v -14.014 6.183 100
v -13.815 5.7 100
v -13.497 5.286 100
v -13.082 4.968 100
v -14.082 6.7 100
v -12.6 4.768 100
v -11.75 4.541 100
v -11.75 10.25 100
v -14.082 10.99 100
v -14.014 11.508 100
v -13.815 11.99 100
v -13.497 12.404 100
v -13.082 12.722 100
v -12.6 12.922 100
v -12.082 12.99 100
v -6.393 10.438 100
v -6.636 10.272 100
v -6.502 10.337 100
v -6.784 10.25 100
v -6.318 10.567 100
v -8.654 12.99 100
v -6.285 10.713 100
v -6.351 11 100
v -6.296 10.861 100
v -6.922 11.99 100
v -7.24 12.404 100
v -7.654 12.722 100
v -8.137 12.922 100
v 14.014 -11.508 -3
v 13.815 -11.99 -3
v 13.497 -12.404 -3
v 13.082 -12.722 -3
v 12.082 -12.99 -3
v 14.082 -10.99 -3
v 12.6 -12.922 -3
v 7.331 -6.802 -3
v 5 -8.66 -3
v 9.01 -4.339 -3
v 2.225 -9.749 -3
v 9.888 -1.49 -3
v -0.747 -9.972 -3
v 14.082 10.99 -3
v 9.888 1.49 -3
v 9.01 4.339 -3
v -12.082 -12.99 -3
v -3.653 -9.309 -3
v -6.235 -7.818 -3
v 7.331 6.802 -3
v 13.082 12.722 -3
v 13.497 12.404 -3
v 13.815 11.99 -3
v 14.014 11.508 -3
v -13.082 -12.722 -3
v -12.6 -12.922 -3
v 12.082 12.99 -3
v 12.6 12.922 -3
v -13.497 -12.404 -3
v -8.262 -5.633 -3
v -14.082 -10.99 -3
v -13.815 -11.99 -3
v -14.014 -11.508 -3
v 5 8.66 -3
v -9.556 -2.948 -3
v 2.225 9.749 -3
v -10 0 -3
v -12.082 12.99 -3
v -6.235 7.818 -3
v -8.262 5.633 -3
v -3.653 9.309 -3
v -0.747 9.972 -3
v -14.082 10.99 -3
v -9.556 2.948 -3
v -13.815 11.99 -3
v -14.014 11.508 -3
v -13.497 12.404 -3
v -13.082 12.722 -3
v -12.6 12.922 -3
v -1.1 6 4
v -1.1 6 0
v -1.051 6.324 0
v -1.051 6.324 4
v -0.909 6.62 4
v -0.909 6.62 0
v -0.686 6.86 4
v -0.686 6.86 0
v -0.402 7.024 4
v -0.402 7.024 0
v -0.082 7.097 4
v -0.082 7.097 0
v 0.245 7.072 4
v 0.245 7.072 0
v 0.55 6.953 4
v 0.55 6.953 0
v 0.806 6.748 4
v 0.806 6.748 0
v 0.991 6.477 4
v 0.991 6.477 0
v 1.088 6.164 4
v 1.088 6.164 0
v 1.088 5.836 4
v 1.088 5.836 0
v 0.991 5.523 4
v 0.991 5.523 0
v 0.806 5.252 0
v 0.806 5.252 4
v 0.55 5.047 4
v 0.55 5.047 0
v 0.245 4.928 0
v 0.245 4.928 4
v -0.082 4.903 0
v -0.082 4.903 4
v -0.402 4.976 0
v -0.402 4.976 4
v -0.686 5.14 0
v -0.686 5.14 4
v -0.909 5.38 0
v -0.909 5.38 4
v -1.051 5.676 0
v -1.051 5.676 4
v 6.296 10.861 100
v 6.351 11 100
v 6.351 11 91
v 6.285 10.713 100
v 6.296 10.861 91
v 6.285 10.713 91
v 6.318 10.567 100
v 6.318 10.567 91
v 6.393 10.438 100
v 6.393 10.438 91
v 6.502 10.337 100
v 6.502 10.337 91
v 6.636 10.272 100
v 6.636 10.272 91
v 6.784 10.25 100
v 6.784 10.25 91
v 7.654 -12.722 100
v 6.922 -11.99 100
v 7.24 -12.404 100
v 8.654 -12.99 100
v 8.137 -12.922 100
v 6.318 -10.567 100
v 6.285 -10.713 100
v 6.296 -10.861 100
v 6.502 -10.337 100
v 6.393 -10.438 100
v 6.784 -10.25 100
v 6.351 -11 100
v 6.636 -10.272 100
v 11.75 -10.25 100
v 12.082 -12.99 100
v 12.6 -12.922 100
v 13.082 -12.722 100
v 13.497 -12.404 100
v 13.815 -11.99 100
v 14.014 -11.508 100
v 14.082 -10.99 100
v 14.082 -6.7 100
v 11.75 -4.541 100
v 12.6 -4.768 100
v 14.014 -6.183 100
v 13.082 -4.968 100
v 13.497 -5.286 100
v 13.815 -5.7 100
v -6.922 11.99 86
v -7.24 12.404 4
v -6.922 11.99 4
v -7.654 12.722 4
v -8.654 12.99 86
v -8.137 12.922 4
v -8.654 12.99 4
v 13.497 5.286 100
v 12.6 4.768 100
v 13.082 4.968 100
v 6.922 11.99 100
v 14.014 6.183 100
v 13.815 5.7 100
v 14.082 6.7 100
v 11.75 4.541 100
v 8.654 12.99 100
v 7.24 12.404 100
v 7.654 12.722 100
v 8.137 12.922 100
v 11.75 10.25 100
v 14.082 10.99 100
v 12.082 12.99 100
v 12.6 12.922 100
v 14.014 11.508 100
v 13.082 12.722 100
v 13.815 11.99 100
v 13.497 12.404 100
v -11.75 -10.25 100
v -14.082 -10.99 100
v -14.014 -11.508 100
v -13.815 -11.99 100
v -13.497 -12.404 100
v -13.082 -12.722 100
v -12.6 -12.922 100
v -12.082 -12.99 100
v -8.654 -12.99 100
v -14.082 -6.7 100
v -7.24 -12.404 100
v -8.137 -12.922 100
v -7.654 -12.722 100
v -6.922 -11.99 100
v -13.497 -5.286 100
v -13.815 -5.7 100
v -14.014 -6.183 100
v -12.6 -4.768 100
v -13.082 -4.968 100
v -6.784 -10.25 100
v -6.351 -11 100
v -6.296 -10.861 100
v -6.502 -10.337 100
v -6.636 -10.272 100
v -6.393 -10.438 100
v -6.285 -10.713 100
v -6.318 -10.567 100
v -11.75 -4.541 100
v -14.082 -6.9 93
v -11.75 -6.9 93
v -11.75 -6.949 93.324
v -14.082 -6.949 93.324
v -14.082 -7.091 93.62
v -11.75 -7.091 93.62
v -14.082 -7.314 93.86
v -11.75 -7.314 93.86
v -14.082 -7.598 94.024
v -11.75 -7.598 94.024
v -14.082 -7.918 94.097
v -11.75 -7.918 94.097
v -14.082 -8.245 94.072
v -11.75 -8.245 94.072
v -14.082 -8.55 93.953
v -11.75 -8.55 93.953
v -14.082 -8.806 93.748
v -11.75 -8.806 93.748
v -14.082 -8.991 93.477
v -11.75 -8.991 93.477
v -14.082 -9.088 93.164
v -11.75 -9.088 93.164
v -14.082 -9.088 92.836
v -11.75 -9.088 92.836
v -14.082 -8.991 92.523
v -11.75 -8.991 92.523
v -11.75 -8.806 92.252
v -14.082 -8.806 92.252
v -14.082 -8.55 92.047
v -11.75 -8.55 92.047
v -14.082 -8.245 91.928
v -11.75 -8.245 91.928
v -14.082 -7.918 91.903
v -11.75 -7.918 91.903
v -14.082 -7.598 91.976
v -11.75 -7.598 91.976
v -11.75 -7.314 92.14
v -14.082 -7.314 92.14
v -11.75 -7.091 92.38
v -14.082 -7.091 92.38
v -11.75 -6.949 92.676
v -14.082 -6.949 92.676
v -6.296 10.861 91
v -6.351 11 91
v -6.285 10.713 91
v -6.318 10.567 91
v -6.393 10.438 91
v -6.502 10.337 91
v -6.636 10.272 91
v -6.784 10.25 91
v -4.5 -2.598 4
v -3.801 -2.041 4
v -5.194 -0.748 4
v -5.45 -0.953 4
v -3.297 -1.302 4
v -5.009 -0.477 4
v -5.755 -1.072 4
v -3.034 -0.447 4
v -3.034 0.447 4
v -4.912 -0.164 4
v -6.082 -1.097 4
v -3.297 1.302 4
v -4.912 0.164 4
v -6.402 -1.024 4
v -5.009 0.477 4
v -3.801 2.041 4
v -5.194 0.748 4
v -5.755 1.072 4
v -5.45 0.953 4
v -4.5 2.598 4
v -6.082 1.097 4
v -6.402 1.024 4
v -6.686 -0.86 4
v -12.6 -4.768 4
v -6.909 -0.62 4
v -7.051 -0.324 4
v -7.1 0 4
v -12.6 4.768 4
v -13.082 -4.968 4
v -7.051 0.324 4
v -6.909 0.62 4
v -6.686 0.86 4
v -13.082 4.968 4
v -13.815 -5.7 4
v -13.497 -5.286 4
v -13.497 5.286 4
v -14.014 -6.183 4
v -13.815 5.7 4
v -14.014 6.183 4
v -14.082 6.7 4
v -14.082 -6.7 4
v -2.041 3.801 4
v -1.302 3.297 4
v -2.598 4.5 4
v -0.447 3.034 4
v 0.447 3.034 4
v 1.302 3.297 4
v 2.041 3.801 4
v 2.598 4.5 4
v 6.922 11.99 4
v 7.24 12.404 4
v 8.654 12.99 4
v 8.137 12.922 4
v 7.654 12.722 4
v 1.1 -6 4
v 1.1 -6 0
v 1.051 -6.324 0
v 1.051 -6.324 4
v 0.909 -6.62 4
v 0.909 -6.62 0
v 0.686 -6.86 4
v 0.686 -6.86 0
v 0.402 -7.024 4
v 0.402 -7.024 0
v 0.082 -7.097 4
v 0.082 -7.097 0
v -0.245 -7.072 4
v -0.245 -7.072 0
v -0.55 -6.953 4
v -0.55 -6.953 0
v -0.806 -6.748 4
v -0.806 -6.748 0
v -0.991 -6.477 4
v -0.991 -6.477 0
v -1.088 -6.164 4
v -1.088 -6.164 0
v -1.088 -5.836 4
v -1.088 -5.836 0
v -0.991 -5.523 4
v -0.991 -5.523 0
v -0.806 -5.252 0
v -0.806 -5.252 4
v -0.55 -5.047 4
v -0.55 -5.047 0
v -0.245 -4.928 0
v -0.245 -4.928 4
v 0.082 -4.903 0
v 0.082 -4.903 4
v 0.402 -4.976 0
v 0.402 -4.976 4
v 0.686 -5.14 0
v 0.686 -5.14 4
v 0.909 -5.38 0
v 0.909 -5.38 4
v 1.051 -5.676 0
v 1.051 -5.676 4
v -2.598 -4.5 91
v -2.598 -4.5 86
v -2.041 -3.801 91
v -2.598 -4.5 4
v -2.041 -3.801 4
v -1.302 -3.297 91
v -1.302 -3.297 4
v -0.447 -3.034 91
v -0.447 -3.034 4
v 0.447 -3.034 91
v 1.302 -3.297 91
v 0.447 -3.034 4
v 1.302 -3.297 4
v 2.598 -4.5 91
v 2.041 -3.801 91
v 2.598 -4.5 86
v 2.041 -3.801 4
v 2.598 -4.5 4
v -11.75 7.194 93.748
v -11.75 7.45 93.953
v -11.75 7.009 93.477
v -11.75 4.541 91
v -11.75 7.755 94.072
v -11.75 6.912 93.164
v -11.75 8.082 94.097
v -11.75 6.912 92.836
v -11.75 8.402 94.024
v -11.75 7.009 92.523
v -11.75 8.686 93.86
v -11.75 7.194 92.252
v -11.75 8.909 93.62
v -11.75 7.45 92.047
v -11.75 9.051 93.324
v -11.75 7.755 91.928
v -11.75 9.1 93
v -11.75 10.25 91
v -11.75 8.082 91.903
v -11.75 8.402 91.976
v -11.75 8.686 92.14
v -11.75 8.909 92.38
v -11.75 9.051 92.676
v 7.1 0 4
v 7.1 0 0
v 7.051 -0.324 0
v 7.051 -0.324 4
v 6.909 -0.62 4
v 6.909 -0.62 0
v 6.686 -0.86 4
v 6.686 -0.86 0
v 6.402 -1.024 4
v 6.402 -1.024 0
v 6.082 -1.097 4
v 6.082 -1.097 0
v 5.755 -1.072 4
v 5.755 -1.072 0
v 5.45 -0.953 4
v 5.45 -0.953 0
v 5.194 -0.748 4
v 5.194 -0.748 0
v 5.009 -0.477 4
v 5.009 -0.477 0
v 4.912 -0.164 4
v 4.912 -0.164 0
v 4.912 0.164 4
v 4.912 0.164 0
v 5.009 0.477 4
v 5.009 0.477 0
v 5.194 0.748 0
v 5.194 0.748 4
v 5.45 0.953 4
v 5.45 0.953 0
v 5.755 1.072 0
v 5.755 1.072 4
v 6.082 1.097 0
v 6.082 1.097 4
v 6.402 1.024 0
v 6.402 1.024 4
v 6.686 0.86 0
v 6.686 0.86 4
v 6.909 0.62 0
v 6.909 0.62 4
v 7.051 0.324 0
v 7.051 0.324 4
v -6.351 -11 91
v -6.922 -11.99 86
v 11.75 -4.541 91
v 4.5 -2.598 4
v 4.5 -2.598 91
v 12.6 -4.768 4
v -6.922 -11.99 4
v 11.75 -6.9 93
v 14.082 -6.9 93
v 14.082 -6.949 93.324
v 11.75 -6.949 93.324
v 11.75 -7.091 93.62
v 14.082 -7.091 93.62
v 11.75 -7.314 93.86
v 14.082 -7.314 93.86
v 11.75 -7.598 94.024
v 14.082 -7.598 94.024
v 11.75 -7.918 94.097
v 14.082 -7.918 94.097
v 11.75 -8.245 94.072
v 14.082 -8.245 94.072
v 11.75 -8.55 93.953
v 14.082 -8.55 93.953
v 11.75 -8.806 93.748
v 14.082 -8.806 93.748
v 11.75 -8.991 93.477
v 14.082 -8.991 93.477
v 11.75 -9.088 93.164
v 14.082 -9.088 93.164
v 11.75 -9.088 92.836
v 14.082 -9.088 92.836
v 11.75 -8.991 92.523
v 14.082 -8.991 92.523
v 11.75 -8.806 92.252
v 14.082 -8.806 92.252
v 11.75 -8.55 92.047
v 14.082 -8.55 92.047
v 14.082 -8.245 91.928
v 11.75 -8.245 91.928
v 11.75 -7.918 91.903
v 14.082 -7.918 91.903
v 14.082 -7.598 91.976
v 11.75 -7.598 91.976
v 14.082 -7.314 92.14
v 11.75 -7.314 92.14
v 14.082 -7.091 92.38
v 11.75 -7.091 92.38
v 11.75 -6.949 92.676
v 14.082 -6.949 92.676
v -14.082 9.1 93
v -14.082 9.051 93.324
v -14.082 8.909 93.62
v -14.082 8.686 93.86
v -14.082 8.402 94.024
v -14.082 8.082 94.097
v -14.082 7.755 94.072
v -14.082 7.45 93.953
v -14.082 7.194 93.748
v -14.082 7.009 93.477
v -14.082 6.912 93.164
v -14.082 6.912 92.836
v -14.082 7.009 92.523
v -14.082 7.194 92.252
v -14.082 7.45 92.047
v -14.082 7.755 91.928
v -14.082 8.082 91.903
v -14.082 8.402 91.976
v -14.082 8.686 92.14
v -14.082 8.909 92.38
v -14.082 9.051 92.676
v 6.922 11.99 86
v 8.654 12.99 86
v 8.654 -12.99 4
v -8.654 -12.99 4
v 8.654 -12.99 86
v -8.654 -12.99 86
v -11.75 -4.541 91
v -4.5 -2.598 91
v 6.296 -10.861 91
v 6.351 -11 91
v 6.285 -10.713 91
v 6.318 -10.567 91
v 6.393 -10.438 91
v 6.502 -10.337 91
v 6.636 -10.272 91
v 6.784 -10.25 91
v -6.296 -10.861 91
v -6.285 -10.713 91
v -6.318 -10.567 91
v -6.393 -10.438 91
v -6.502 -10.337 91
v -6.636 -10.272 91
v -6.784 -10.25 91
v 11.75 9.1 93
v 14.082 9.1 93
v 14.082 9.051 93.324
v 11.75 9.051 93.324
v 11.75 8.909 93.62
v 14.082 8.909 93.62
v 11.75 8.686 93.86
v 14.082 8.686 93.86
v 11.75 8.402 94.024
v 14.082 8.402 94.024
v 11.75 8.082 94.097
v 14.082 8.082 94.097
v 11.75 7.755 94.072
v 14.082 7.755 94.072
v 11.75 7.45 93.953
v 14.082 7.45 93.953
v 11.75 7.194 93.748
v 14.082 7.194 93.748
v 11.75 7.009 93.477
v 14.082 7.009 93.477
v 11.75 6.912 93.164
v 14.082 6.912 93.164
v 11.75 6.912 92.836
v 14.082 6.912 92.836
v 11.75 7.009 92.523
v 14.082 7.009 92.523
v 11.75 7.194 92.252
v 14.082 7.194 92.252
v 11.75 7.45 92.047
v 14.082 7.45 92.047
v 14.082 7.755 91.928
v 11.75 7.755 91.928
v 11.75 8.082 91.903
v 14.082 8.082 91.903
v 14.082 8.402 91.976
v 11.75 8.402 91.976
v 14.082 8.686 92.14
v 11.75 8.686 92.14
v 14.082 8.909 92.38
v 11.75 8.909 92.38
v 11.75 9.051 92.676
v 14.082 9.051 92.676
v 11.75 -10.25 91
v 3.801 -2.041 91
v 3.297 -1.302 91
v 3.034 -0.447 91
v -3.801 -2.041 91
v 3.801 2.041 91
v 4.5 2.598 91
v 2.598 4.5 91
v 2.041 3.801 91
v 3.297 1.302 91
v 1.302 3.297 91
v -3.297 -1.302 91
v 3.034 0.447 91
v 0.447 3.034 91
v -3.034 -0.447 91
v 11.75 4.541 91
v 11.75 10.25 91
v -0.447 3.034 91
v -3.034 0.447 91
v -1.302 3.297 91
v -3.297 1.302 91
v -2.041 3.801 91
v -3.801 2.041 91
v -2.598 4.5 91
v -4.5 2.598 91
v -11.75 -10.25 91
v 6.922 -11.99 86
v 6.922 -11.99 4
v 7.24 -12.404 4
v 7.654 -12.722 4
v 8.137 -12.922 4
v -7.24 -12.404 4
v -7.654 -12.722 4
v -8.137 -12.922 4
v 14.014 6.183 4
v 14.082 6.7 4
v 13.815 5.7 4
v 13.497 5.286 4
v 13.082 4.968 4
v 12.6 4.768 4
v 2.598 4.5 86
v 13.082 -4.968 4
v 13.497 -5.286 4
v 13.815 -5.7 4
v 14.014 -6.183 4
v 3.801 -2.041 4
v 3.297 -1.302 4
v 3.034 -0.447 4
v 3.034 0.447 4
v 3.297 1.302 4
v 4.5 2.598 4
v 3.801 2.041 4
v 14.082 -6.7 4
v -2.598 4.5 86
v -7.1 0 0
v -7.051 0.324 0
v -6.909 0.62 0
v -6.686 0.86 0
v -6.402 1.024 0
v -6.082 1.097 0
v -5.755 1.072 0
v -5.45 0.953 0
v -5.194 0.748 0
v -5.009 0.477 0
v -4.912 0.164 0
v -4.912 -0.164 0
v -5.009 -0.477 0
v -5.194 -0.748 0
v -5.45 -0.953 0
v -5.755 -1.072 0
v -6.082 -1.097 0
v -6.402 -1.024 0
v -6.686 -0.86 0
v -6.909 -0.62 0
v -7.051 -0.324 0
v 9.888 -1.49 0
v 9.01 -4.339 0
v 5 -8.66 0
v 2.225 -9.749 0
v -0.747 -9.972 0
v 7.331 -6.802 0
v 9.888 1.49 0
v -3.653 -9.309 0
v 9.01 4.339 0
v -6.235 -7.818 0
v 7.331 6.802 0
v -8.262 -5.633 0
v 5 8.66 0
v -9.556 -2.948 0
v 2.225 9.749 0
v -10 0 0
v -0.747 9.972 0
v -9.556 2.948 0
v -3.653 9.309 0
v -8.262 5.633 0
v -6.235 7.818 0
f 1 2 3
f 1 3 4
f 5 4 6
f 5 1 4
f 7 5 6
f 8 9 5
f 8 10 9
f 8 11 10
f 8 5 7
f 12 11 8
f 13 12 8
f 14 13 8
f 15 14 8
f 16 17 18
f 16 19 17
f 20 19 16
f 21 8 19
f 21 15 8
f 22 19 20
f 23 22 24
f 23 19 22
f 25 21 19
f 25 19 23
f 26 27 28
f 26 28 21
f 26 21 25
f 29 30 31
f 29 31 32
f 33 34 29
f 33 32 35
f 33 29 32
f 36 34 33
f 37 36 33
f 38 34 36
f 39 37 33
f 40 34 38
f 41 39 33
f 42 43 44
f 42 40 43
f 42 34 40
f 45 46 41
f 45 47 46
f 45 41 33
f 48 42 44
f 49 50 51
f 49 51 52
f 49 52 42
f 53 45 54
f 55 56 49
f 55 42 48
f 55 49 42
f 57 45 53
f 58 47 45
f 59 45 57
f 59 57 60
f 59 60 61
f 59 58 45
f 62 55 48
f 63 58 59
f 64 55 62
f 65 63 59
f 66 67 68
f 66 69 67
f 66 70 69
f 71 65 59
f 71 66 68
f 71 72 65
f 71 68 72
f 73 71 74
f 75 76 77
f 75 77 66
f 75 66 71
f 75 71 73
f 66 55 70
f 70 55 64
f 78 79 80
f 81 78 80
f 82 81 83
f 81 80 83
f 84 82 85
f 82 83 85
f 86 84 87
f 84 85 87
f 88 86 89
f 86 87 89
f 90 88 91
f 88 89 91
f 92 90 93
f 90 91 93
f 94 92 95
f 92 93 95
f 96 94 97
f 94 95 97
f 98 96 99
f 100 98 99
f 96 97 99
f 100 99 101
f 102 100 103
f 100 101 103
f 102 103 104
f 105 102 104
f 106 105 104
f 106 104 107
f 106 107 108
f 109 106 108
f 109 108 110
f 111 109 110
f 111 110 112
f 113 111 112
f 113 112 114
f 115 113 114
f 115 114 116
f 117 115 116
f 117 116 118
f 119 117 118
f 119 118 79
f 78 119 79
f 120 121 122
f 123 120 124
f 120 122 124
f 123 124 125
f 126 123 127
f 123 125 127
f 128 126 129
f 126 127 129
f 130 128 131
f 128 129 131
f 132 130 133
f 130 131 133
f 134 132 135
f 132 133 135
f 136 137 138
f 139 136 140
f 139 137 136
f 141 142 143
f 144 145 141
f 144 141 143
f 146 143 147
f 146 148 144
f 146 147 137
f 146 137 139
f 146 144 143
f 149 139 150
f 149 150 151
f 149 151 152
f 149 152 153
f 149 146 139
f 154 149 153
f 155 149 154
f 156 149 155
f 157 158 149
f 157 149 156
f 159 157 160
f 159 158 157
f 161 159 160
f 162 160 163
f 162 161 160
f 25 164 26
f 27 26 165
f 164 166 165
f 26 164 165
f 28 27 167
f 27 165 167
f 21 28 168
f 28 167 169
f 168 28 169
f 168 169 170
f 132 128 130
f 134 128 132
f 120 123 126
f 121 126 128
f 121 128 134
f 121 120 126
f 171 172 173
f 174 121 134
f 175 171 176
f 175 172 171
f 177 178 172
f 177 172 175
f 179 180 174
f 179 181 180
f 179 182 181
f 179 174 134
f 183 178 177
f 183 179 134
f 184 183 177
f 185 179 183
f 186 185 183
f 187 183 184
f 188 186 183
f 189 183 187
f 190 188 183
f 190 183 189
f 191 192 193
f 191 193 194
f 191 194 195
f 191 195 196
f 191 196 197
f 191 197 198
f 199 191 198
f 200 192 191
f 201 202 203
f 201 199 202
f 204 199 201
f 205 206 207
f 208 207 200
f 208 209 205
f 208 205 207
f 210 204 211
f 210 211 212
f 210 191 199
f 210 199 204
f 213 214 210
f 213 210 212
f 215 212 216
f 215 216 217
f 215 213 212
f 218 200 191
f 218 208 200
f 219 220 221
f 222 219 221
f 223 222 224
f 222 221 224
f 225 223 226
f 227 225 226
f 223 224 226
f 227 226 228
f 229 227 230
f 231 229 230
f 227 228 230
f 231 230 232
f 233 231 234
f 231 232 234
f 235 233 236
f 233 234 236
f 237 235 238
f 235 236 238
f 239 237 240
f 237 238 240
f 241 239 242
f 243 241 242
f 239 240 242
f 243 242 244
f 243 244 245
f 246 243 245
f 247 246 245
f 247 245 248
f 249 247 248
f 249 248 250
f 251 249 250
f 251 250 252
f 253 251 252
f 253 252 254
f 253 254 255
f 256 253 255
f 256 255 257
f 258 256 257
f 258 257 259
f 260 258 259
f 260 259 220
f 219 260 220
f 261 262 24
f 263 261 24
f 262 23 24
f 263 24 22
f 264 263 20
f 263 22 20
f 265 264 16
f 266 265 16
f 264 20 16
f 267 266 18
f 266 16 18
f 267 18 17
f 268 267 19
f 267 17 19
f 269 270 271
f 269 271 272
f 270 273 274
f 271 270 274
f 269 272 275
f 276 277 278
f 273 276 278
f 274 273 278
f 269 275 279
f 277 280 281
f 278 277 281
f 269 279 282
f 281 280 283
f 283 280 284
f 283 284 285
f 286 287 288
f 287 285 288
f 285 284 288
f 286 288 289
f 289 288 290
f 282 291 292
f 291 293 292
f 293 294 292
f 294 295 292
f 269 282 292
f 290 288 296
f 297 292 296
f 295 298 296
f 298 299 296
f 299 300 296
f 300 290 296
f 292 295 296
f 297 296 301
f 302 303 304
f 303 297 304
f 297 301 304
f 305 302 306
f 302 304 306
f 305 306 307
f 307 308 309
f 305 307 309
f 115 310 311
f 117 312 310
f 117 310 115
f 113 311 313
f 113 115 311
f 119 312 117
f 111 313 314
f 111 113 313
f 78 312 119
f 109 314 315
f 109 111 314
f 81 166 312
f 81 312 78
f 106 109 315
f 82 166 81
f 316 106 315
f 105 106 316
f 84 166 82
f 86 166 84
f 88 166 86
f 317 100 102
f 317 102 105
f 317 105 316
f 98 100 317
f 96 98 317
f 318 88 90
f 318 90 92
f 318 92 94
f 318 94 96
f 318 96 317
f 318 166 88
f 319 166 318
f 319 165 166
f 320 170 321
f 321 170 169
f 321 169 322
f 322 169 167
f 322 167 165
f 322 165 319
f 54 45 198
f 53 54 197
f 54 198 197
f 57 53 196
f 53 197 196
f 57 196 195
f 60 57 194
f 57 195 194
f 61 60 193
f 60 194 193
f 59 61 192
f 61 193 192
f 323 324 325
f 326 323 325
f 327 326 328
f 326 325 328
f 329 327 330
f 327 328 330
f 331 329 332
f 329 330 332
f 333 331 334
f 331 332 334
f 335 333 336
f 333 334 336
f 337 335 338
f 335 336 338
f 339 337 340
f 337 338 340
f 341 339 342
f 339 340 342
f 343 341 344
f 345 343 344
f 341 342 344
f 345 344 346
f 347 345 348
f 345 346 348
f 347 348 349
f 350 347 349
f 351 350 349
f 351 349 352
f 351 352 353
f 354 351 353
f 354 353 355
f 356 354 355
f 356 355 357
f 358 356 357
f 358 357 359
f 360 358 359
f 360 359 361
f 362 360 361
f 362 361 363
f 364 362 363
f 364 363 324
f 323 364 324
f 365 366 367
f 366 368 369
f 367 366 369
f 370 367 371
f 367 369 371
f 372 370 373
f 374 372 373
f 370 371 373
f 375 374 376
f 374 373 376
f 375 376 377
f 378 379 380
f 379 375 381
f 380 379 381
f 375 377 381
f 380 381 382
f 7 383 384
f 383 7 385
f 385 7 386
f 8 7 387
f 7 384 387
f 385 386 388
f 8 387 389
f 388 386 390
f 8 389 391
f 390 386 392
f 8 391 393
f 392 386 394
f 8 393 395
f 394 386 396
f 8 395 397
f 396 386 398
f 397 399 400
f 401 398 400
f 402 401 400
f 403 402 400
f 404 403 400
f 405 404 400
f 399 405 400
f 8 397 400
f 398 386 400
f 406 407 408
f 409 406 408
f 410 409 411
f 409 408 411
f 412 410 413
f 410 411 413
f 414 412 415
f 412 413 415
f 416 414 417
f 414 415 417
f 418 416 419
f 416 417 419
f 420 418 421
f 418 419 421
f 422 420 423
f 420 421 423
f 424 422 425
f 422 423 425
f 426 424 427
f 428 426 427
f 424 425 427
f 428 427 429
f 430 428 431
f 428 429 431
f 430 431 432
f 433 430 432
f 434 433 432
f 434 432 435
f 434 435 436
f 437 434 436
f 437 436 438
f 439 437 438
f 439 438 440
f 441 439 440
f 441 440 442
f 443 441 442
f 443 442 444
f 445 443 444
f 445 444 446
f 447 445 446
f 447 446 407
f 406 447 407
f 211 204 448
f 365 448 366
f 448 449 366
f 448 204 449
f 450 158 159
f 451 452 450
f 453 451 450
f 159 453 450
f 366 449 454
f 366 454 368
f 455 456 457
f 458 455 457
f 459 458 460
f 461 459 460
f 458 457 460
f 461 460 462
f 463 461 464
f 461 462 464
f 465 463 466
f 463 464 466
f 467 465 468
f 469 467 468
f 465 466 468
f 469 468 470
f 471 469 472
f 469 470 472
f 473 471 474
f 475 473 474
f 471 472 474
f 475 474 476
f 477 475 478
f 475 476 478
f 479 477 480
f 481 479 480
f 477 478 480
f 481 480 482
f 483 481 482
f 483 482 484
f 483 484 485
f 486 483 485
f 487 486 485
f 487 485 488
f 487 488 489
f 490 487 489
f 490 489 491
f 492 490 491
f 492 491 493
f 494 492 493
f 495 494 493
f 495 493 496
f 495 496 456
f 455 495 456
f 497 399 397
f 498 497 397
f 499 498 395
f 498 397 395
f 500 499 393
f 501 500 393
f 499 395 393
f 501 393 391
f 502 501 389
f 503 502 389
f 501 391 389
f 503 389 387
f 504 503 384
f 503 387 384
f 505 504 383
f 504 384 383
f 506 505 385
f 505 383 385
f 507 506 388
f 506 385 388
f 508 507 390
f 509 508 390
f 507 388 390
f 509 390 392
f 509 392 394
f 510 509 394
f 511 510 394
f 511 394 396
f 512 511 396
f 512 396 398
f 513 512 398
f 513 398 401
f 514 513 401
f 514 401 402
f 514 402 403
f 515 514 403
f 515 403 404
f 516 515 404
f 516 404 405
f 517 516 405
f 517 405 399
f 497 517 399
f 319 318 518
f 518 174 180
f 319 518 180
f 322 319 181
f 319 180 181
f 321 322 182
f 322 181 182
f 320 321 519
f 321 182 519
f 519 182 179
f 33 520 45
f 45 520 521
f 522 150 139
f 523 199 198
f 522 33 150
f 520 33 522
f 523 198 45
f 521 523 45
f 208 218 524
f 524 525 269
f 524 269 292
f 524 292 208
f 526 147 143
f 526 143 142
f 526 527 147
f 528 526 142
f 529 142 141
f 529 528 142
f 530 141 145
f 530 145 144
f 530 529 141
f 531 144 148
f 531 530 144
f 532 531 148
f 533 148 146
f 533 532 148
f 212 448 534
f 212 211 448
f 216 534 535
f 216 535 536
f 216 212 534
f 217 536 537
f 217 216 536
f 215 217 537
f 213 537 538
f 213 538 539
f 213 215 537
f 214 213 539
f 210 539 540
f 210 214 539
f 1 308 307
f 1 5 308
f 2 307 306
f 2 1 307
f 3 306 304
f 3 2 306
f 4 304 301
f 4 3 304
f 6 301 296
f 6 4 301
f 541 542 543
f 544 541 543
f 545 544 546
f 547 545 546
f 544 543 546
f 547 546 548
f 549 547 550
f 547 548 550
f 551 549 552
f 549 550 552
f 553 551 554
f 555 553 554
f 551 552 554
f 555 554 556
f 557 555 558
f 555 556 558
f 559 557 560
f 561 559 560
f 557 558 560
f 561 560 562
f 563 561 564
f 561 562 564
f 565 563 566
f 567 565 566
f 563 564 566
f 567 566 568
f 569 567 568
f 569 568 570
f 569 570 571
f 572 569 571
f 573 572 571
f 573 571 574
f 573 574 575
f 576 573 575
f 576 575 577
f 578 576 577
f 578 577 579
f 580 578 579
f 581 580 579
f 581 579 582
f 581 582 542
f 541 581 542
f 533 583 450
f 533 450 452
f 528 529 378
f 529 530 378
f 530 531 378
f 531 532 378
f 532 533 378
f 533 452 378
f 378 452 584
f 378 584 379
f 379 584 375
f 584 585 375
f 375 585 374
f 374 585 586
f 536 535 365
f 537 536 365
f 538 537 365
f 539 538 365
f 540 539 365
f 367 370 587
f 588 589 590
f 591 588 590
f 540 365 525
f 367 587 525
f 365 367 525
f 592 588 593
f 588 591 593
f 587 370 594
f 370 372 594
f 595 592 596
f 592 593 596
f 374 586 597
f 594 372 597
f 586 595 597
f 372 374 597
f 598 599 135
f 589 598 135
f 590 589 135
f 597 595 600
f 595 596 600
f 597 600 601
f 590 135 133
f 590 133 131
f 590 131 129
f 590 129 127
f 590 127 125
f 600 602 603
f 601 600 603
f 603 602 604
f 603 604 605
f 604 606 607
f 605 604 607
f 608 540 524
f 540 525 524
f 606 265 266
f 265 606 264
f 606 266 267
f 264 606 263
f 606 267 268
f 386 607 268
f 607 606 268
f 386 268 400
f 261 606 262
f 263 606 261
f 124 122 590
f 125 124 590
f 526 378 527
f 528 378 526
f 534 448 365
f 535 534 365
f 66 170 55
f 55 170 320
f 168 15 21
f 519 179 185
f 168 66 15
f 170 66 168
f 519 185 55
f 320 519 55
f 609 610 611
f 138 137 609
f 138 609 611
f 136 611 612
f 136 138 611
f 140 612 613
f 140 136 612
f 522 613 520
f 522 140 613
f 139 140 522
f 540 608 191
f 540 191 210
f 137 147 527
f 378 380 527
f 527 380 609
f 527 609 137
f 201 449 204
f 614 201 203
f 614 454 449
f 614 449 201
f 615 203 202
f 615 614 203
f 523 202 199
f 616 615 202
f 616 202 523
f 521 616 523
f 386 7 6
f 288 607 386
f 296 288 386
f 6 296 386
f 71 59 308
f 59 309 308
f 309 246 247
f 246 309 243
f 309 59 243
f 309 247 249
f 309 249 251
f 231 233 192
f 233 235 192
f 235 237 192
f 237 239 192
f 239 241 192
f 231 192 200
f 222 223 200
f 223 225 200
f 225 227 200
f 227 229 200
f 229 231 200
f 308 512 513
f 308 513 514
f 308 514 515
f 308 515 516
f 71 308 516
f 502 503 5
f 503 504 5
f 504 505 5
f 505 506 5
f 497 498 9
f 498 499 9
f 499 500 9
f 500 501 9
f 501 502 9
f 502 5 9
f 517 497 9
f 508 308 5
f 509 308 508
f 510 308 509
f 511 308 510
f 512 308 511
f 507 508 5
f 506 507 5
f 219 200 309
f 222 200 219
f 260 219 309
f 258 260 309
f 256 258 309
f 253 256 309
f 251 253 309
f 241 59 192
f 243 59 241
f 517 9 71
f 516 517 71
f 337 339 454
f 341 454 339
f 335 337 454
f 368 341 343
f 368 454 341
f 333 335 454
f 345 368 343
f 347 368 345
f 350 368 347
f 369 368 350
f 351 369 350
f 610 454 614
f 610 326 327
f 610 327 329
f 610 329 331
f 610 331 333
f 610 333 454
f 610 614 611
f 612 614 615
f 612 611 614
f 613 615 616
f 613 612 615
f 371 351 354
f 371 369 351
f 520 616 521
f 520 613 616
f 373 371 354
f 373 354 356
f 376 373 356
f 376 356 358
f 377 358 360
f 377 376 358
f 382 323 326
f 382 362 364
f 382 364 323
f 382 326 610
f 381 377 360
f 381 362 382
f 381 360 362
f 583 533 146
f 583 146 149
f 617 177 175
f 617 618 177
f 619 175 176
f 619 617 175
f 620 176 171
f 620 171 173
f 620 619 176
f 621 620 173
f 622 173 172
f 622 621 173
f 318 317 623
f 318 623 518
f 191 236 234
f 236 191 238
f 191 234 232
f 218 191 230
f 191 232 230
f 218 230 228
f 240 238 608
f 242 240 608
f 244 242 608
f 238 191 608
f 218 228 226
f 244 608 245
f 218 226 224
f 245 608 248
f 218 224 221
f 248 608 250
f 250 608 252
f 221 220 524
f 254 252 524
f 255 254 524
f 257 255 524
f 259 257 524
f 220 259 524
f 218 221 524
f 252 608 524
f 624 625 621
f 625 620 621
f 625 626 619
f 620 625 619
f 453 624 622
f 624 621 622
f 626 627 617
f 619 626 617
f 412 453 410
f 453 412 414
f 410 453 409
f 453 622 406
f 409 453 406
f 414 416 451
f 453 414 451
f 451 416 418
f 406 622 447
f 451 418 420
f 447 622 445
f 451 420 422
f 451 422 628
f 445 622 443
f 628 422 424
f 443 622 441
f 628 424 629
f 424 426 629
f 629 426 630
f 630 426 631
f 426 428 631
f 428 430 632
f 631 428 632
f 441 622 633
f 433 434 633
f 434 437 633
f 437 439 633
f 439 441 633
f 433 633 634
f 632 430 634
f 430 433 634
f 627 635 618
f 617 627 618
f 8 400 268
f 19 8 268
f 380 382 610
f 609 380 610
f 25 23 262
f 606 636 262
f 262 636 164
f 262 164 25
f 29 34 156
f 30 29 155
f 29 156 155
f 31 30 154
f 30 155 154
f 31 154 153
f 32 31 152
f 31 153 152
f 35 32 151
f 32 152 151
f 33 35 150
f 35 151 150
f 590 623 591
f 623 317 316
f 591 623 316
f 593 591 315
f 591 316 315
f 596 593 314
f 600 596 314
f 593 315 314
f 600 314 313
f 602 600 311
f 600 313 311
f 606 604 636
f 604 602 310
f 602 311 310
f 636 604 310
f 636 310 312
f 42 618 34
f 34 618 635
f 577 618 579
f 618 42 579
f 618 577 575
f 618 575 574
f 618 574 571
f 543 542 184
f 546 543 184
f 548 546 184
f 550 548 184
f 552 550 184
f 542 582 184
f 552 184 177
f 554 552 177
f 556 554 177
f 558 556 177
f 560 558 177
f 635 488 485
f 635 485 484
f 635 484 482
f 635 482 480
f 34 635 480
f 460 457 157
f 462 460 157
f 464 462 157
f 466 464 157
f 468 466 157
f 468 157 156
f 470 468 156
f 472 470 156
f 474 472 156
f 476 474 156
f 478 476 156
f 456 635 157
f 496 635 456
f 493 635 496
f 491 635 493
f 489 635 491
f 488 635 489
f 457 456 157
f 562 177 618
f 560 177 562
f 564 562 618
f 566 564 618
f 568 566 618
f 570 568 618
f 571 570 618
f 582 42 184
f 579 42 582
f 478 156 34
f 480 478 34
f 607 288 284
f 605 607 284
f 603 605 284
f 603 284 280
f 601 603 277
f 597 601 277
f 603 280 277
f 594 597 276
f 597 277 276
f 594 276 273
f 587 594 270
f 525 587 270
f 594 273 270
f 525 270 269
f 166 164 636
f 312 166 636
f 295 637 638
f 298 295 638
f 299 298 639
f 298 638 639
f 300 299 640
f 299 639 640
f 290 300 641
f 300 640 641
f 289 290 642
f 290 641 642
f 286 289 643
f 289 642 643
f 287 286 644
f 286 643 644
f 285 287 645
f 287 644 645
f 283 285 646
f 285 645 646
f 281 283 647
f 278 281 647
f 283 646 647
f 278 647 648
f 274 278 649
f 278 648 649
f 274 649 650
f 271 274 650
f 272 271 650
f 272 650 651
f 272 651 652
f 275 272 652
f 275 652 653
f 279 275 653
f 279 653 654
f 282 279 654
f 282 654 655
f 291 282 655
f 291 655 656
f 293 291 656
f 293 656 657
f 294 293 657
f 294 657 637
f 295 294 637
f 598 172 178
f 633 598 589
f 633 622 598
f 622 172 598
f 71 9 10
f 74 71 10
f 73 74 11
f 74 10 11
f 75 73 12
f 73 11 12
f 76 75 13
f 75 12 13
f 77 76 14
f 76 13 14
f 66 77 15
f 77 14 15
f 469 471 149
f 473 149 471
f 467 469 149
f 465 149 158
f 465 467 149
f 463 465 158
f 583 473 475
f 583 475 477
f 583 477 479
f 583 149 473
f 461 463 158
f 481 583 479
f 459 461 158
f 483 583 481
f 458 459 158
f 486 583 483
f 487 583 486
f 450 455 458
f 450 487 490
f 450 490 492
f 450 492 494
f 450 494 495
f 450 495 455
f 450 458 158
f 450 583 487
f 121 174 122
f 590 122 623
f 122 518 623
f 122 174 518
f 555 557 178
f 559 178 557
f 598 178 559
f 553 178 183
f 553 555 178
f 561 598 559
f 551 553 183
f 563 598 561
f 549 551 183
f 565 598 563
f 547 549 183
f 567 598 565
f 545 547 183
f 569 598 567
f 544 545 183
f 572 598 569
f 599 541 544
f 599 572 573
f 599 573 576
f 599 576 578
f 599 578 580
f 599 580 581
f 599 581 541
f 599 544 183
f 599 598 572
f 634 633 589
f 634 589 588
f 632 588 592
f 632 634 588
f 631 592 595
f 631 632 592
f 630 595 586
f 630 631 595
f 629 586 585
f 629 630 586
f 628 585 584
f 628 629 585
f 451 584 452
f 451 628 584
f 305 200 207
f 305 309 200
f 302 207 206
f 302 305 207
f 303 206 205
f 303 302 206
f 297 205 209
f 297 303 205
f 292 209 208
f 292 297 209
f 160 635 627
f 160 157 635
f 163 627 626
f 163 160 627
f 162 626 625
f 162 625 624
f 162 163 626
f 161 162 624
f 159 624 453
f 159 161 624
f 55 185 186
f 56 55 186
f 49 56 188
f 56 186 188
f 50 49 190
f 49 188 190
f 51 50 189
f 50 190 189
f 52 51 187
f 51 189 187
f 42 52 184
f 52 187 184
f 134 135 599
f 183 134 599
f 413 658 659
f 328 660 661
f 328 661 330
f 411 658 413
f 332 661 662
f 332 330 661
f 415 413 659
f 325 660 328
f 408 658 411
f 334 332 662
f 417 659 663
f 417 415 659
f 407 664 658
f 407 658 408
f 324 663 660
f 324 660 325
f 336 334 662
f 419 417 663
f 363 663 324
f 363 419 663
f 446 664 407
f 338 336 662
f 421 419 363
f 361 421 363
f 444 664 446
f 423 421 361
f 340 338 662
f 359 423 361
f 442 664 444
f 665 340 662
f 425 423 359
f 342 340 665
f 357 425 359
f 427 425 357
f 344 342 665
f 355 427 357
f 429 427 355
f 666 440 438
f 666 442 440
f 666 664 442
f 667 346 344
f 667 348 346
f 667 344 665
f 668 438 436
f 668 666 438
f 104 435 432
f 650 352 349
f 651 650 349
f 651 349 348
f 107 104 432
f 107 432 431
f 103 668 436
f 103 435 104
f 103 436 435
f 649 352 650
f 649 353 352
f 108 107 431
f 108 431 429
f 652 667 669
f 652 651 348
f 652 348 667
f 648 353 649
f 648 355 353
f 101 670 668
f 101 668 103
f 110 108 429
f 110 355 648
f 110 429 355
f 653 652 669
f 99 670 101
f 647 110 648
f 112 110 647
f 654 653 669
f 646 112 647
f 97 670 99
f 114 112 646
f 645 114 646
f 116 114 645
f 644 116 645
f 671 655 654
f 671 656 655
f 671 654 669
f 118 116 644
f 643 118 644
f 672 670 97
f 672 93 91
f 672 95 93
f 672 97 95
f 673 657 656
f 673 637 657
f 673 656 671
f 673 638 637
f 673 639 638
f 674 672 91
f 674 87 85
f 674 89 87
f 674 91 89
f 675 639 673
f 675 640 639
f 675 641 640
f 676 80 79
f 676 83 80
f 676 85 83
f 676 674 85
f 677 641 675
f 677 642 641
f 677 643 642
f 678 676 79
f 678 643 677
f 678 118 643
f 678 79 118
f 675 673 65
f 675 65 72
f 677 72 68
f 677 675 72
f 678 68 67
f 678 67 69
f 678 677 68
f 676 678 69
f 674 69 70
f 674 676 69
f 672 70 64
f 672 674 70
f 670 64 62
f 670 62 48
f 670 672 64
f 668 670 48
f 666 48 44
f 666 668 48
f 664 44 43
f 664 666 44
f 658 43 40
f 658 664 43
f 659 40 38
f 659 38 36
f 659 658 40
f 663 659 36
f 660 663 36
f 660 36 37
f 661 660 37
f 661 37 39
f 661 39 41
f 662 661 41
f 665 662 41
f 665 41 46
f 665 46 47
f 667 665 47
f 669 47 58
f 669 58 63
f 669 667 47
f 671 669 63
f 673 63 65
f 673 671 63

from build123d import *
from build123d.topology import SkipClean

# Parameters (mm, degrees)
SKETCH_1_R               = 15
EXTRUDE_1_DEPTH          = 91
SKETCH_2_R               = 1.1
CUT_EXTRUDE_1_DEPTH      = 10
SKETCH_3_W               = 28.98
SKETCH_3_H               = 25.98
SKETCH_3_W_2             = 23.5
SKETCH_3_H_2             = 20.5
EXTRUDE_2_DEPTH          = 9
CUT_EXTRUDE_2_DEPTH      = 87
SKETCH_6_W               = 28.98
SKETCH_6_H               = 25.98
EXTRUDE_6_DEPTH          = 5
SKETCH_7_R               = 1.1
CUT_EXTRUDE_3_DEPTH      = 106.331192436
SKETCH_10_R              = 0.8
CUT_EXTRUDE_4_DEPTH      = 99.315817649
CUT_EXTRUDE_5_DEPTH      = 89.577649551
FILLET_1_R               = 0.5
EXTRUDE_7_DEPTH          = 82
SKETCH_17_W              = 0.407540604
SKETCH_17_H              = 25.98
CUT_EXTRUDE_7_DEPTH      = 89.577649551
FILLET_3_R               = 2
CUT_EXTRUDE_6_DEPTH      = 89.577649551
PATTERN_CIRCULAR_4_COUNT = 4
BOSS_EXTRUDE1_START      = 86
BOSS_EXTRUDE1_DEPTH      = 86
SKETCH3_OUTSIDE_W        = 53.726
SKETCH3_OUTSIDE_H        = 53.726
CUT_EXTRUDE1_DEPTH       = 103.225241501
SKETCH4_R                = 10
SKETCH4_R_2              = 0.8
BOSS_EXTRUDE2_DEPTH      = 3
FILLET1_R                = 2
SKETCH5_R                = 0.8
BOSS_EXTRUDE3_DEPTH      = 7


with BuildPart() as part:
    # 草图1 → 凸台-拉伸1 (new body)
    with BuildSketch(Plane.XY):
        Circle(SKETCH_1_R)
    extrude(amount=EXTRUDE_1_DEPTH)

    # 草图2 → 切除-拉伸1 (cut)
    with BuildSketch(Plane(origin=(0, 0, 0), x_dir=(-1, 0, 0), z_dir=(0, 0, -1))):
        with Locations((0, 6)):
            Circle(SKETCH_2_R)
        with Locations(Location((0, -6, 0), (0, 0, 180))):
            Circle(SKETCH_2_R)
        with Locations((6, 0)):
            Circle(SKETCH_2_R)
        with Locations(Location((-6, 0, 0), (0, 0, 180))):
            Circle(SKETCH_2_R)
    extrude(amount=-CUT_EXTRUDE_1_DEPTH, mode=Mode.SUBTRACT)

    # 草图3 → 凸台-拉伸2 (add)
    with BuildSketch(Plane.XY.offset(91)):
        Rectangle(SKETCH_3_W, SKETCH_3_H)
        Rectangle(SKETCH_3_W_2, SKETCH_3_H_2, mode=Mode.SUBTRACT)
    extrude(amount=EXTRUDE_2_DEPTH)

    # 草图4 → 切除-拉伸2 (cut)
    with BuildSketch(Plane(origin=(0, 0, 4), x_dir=(-1, 0, 0), z_dir=(0, 0, -1))):
        with BuildLine():
            Line((-2.598076211, 4.5), (-7.5, 12.990381057))
            ThreePointArc((-7.5, 12.990381057), (0, 15), (7.5, 12.990381057))
            Line((7.5, 12.990381057), (2.598076211, 4.5))
            ThreePointArc((2.598076211, 4.5), (0, 3), (-2.598076211, 4.5))
        make_face()
        with BuildLine():
            Line((4.5, -2.598076211), (12.990381057, -7.5))
            ThreePointArc((12.990381057, -7.5), (15, 0), (12.990381057, 7.5))
            Line((12.990381057, 7.5), (4.5, 2.598076211))
            ThreePointArc((4.5, 2.598076211), (3, 0), (4.5, -2.598076211))
        make_face()
        with BuildLine():
            Line((-2.598076211, -4.5), (-7.5, -12.990381057))
            ThreePointArc((-7.5, -12.990381057), (0, -15), (7.5, -12.990381057))
            Line((7.5, -12.990381057), (2.598076211, -4.5))
            ThreePointArc((2.598076211, -4.5), (0, -3), (-2.598076211, -4.5))
        make_face()
        with BuildLine():
            Line((-4.5, 2.598076211), (-12.990381057, 7.5))
            ThreePointArc((-12.990381057, 7.5), (-15, 0), (-12.990381057, -7.5))
            Line((-12.990381057, -7.5), (-4.5, -2.598076211))
            ThreePointArc((-4.5, -2.598076211), (-3, 0), (-4.5, 2.598076211))
        make_face()
    extrude(amount=-CUT_EXTRUDE_2_DEPTH, mode=Mode.SUBTRACT)

    # 草图6 → 凸台-拉伸6 (add)
    with BuildSketch(Plane(origin=(0, 0, 91), x_dir=(-1, 0, 0), z_dir=(0, 0, -1))):
        Rectangle(SKETCH_6_W, SKETCH_6_H)
    extrude(amount=EXTRUDE_6_DEPTH)

    # 草图7 → 切除-拉伸3 (cut, through all)
    with BuildSketch(Plane(origin=(14.49, 0, 0), x_dir=(0, 0, -1), z_dir=(1, 0, 0))):
        with Locations(Location((-93, -8, 0), (0, 0, 90))):
            Circle(SKETCH_7_R)
        with Locations(Location((-93, 8, 0), (0, 0, 90))):
            Circle(SKETCH_7_R)
    extrude(amount=-CUT_EXTRUDE_3_DEPTH, mode=Mode.SUBTRACT)

    # 草图10 → 切除-拉伸4 (cut, through all)
    with BuildSketch(Plane.XY.offset(4)):
        with Locations((0, -12)):
            Circle(SKETCH_10_R)
    cut_extrude_4 = extrude(amount=-CUT_EXTRUDE_4_DEPTH, mode=Mode.SUBTRACT)

    # 草图11 → 切除-拉伸5 (cut, through all)
    with BuildSketch(Plane(origin=(0, 0, 86), x_dir=(-1, 0, 0), z_dir=(0, 0, -1))):
        with BuildLine():
            Line((2.598076211, 4.5), (7.499779997, 12.99))
            Line((7.499779997, 12.99), (-7.499779997, 12.99))
            Line((-7.499779997, 12.99), (-2.598076211, 4.5))
            ThreePointArc((-2.598076211, 4.5), (0, 3), (2.598076211, 4.5))
        make_face()
        with BuildLine():
            Line((-2.598076211, -4.5), (-7.499779997, -12.99))
            Line((-7.499779997, -12.99), (7.499779997, -12.99))
            Line((7.499779997, -12.99), (2.598076211, -4.5))
            ThreePointArc((2.598076211, -4.5), (0, -3), (-2.598076211, -4.5))
        make_face()
    extrude(amount=-CUT_EXTRUDE_5_DEPTH, mode=Mode.SUBTRACT)

    # 圆角1
    fillet_1_edges = [part.edges().sort_by_distance(p)[0] for p in [
        (5.917840259, 10.25, 95.5),
        (-5.917840259, 10.25, 95.5),
        (-5.917840259, -10.25, 95.5),
        (5.917840259, -10.25, 95.5),
    ]]
    fillet(fillet_1_edges, radius=FILLET_1_R)

    # 草图12 → 凸台-拉伸7 (add)
    with SkipClean():  # the faces are left unmerged after this step: merging them gives an invalid solid
        with BuildSketch(Plane.XY.offset(4)):
            with BuildLine():
                Line((-4.5, 2.598076211), (-14.082459396, 5.165688468))
                ThreePointArc((-14.082459396, 5.165688468), (-13.586645102, 6.356341311), (-12.990381057, 7.5))
                Line((-12.990381057, 7.5), (-4.5, 2.598076211))
            make_face()
            with BuildLine():
                Line((-12.990381057, -7.5), (-4.5, -2.598076211))
                Line((-4.5, -2.598076211), (-14.082459396, -5.165688468))
                ThreePointArc((-14.082459396, -5.165688468), (-13.586645102, -6.356341311), (-12.990381057, -7.5))
            make_face()
            with BuildLine():
                Line((4.5, -2.598076211), (14.082459396, -5.165688468))
                ThreePointArc((14.082459396, -5.165688468), (13.586645102, -6.356341311), (12.990381057, -7.5))
                Line((12.990381057, -7.5), (4.5, -2.598076211))
            make_face()
            with BuildLine():
                Line((4.5, 2.598076211), (12.990381057, 7.5))
                ThreePointArc((12.990381057, 7.5), (13.586645102, 6.356341311), (14.082459396, 5.165688468))
                Line((14.082459396, 5.165688468), (4.5, 2.598076211))
            make_face()
        extrude(amount=EXTRUDE_7_DEPTH)

    # 草图17 → 切除-拉伸7 (cut, through all)
    with SkipClean():  # the faces are left unmerged after this step: merging them gives an invalid solid
        with BuildSketch(Plane(origin=(0, 0, 86), x_dir=(-1, 0, 0), z_dir=(0, 0, -1))):
            with Locations((14.286229698, 0)):
                Rectangle(SKETCH_17_W, SKETCH_17_H)
            with Locations((-14.286229698, 0)):
                Rectangle(SKETCH_17_W, SKETCH_17_H)
        extrude(amount=-CUT_EXTRUDE_7_DEPTH, mode=Mode.SUBTRACT)

    # 圆角3
    fillet_3_edges = [part.edges().sort_by_distance(p)[0] for p in [
        (-14.082459396, -12.99, 93),
        (-14.082459396, 12.99, 93),
        (14.082459396, 12.99, 93),
        (14.082459396, -12.99, 93),
    ]]
    fillet(fillet_3_edges, radius=FILLET_3_R)

    # 草图13 → 切除-拉伸6 (cut, through all)
    with SkipClean():  # the faces are left unmerged after this step: merging them gives an invalid solid
        with BuildSketch(Plane(origin=(0, 0, 86), x_dir=(-1, 0, 0), z_dir=(0, 0, -1))):
            with BuildLine():
                Line((-4.5, -2.598076211), (-14.082459396, -5.165688468))
                Line((-14.082459396, -5.165688468), (-14.082459396, 5.165688468))
                Line((-14.082459396, 5.165688468), (-4.5, 2.598076211))
                ThreePointArc((-4.5, 2.598076211), (-3, 0), (-4.5, -2.598076211))
            make_face()
            with BuildLine():
                Line((14.082459396, 5.165688468), (14.082459396, -5.165688468))
                Line((14.082459396, -5.165688468), (4.5, -2.598076211))
                ThreePointArc((4.5, -2.598076211), (3, 0), (4.5, 2.598076211))
                Line((4.5, 2.598076211), (14.082459396, 5.165688468))
            make_face()
        extrude(amount=-CUT_EXTRUDE_6_DEPTH, mode=Mode.SUBTRACT)

    # 阵列(圆周)4: 切除-拉伸4 ×4 about axis
    with SkipClean():  # the faces are left unmerged after this step: merging them gives an invalid solid
        pattern_circular_4_axis = Axis((0, 0, 0), (0, 0, 1))
        for i in range(1, PATTERN_CIRCULAR_4_COUNT):
            add(cut_extrude_4.rotate(pattern_circular_4_axis, i * 360 / PATTERN_CIRCULAR_4_COUNT), mode=Mode.SUBTRACT)

    # Sketch1 → Boss-Extrude1 (add)
    with BuildSketch(Plane(origin=(0, 0, 86), x_dir=(-1, 0, 0), z_dir=(0, 0, -1)).offset(BOSS_EXTRUDE1_START)):
        with BuildLine():
            Line((7.500659971, -12.99), (12.082459396, -12.99))
            ThreePointArc((12.082459396, -12.99), (13.496672959, -12.404213562), (14.082459396, -10.99))
            Line((14.082459396, -10.99), (14.082459396, -5.165688468))
            ThreePointArc((14.082459396, -5.165688468), (11.478794499, -9.655945156), (7.500659971, -12.99))
        make_face()
        with BuildLine():
            Line((-14.082459396, -5.165688468), (-14.082459396, -10.99))
            ThreePointArc((-14.082459396, -10.99), (-13.496672959, -12.404213562), (-12.082459396, -12.99))
            Line((-12.082459396, -12.99), (-7.500659971, -12.99))
            ThreePointArc((-7.500659971, -12.99), (-11.478794499, -9.655945156), (-14.082459396, -5.165688468))
        make_face()
        with BuildLine():
            Line((-7.500659971, 12.99), (-12.082459396, 12.99))
            ThreePointArc((-12.082459396, 12.99), (-13.496672959, 12.404213562), (-14.082459396, 10.99))
            Line((-14.082459396, 10.99), (-14.082459396, 5.165688468))
            ThreePointArc((-14.082459396, 5.165688468), (-11.478794499, 9.655945156), (-7.500659971, 12.99))
        make_face()
        with BuildLine():
            Line((14.082459396, 5.165688468), (14.082459396, 10.99))
            ThreePointArc((14.082459396, 10.99), (13.496672959, 12.404213562), (12.082459396, 12.99))
            Line((12.082459396, 12.99), (7.500659971, 12.99))
            ThreePointArc((7.500659971, 12.99), (11.478794499, 9.655945156), (14.082459396, 5.165688468))
        make_face()
    extrude(amount=-BOSS_EXTRUDE1_DEPTH)

    # Sketch3 outside → Cut-Extrude1 (cut, through all)
    with BuildSketch(Plane(origin=(0, 0, 0), x_dir=(-1, 0, 0), z_dir=(0, 0, -1))):
        Rectangle(SKETCH3_OUTSIDE_W, SKETCH3_OUTSIDE_H)
        with BuildLine():
            Line((-7.500659971, 12.99), (7.500659971, 12.99))
            Line((7.500659971, 12.99), (12.082459396, 12.99))
            ThreePointArc((12.082459396, 12.99), (13.496672959, 12.404213562), (14.082459396, 10.99))
            Line((14.082459396, 10.99), (14.082459396, 5.165688468))
            Line((14.082459396, 5.165688468), (14.082459396, -5.165688468))
            Line((14.082459396, -5.165688468), (14.082459396, -10.99))
            ThreePointArc((14.082459396, -10.99), (13.496672959, -12.404213562), (12.082459396, -12.99))
            Line((12.082459396, -12.99), (7.500659971, -12.99))
            Line((7.500659971, -12.99), (-7.500659971, -12.99))
            Line((-7.500659971, -12.99), (-12.082459396, -12.99))
            ThreePointArc((-12.082459396, -12.99), (-13.496672959, -12.404213562), (-14.082459396, -10.99))
            Line((-14.082459396, -10.99), (-14.082459396, -5.165688468))
            Line((-14.082459396, -5.165688468), (-14.082459396, 5.165688468))
            Line((-14.082459396, 5.165688468), (-14.082459396, 10.99))
            ThreePointArc((-14.082459396, 10.99), (-13.496672959, 12.404213562), (-12.082459396, 12.99))
            Line((-12.082459396, 12.99), (-7.500659971, 12.99))
        make_face(mode=Mode.SUBTRACT)
    extrude(amount=-CUT_EXTRUDE1_DEPTH, mode=Mode.SUBTRACT)

    # Sketch4 → Boss-Extrude2 (add)
    with BuildSketch(Plane(origin=(0, 0, 0), x_dir=(-1, 0, 0), z_dir=(0, 0, -1))):
        with BuildLine():
            Line((-14.082459396, 10.99), (-14.082459396, -10.99))
            ThreePointArc((-14.082459396, -10.99), (-13.496672959, -12.404213562), (-12.082459396, -12.99))
            Line((-12.082459396, -12.99), (12.082459396, -12.99))
            ThreePointArc((12.082459396, -12.99), (13.496672959, -12.404213562), (14.082459396, -10.99))
            Line((14.082459396, -10.99), (14.082459396, 10.99))
            ThreePointArc((14.082459396, 10.99), (13.496672959, 12.404213562), (12.082459396, 12.99))
            Line((12.082459396, 12.99), (-12.082459396, 12.99))
            ThreePointArc((-12.082459396, 12.99), (-13.496672959, 12.404213562), (-14.082459396, 10.99))
        make_face()
        Circle(SKETCH4_R, mode=Mode.SUBTRACT)
        with Locations(Location((0, -12, 0), (0, 0, 180))):
            Circle(SKETCH4_R_2, mode=Mode.SUBTRACT)
        with Locations(Location((12, 0, 0), (0, 0, 270))):
            Circle(SKETCH4_R_2, mode=Mode.SUBTRACT)
        with Locations(Location((-12, 0, 0), (0, 0, 90))):
            Circle(SKETCH4_R_2, mode=Mode.SUBTRACT)
        with Locations((0, 12)):
            Circle(SKETCH4_R_2, mode=Mode.SUBTRACT)
    extrude(amount=BOSS_EXTRUDE2_DEPTH)

    # Fillet1
    fillet1_edges = [part.edges().sort_by_distance(p)[0] for p in [
        (7.499779997, 12.99, 52),
        (-7.499779997, 12.99, 52),
        (-7.499779997, -12.99, 52),
        (7.499779997, -12.99, 52),
        (-14.082459396, -5.165688468, 52),
        (-14.082459396, 5.165688468, 52),
        (14.082459396, 5.165688468, 52),
        (14.082459396, -5.165688468, 52),
    ]]
    fillet(fillet1_edges, radius=FILLET1_R)

    # Sketch5 → Boss-Extrude3 (add)
    with BuildSketch(Plane.XY.offset(4)):
        with Locations((0, -12)):
            Circle(SKETCH5_R)
        with Locations((12, 0)):
            Circle(SKETCH5_R)
        with Locations((0, 12)):
            Circle(SKETCH5_R)
        with Locations((-12, 0)):
            Circle(SKETCH5_R)
    extrude(amount=-BOSS_EXTRUDE3_DEPTH)


solid = part.part
